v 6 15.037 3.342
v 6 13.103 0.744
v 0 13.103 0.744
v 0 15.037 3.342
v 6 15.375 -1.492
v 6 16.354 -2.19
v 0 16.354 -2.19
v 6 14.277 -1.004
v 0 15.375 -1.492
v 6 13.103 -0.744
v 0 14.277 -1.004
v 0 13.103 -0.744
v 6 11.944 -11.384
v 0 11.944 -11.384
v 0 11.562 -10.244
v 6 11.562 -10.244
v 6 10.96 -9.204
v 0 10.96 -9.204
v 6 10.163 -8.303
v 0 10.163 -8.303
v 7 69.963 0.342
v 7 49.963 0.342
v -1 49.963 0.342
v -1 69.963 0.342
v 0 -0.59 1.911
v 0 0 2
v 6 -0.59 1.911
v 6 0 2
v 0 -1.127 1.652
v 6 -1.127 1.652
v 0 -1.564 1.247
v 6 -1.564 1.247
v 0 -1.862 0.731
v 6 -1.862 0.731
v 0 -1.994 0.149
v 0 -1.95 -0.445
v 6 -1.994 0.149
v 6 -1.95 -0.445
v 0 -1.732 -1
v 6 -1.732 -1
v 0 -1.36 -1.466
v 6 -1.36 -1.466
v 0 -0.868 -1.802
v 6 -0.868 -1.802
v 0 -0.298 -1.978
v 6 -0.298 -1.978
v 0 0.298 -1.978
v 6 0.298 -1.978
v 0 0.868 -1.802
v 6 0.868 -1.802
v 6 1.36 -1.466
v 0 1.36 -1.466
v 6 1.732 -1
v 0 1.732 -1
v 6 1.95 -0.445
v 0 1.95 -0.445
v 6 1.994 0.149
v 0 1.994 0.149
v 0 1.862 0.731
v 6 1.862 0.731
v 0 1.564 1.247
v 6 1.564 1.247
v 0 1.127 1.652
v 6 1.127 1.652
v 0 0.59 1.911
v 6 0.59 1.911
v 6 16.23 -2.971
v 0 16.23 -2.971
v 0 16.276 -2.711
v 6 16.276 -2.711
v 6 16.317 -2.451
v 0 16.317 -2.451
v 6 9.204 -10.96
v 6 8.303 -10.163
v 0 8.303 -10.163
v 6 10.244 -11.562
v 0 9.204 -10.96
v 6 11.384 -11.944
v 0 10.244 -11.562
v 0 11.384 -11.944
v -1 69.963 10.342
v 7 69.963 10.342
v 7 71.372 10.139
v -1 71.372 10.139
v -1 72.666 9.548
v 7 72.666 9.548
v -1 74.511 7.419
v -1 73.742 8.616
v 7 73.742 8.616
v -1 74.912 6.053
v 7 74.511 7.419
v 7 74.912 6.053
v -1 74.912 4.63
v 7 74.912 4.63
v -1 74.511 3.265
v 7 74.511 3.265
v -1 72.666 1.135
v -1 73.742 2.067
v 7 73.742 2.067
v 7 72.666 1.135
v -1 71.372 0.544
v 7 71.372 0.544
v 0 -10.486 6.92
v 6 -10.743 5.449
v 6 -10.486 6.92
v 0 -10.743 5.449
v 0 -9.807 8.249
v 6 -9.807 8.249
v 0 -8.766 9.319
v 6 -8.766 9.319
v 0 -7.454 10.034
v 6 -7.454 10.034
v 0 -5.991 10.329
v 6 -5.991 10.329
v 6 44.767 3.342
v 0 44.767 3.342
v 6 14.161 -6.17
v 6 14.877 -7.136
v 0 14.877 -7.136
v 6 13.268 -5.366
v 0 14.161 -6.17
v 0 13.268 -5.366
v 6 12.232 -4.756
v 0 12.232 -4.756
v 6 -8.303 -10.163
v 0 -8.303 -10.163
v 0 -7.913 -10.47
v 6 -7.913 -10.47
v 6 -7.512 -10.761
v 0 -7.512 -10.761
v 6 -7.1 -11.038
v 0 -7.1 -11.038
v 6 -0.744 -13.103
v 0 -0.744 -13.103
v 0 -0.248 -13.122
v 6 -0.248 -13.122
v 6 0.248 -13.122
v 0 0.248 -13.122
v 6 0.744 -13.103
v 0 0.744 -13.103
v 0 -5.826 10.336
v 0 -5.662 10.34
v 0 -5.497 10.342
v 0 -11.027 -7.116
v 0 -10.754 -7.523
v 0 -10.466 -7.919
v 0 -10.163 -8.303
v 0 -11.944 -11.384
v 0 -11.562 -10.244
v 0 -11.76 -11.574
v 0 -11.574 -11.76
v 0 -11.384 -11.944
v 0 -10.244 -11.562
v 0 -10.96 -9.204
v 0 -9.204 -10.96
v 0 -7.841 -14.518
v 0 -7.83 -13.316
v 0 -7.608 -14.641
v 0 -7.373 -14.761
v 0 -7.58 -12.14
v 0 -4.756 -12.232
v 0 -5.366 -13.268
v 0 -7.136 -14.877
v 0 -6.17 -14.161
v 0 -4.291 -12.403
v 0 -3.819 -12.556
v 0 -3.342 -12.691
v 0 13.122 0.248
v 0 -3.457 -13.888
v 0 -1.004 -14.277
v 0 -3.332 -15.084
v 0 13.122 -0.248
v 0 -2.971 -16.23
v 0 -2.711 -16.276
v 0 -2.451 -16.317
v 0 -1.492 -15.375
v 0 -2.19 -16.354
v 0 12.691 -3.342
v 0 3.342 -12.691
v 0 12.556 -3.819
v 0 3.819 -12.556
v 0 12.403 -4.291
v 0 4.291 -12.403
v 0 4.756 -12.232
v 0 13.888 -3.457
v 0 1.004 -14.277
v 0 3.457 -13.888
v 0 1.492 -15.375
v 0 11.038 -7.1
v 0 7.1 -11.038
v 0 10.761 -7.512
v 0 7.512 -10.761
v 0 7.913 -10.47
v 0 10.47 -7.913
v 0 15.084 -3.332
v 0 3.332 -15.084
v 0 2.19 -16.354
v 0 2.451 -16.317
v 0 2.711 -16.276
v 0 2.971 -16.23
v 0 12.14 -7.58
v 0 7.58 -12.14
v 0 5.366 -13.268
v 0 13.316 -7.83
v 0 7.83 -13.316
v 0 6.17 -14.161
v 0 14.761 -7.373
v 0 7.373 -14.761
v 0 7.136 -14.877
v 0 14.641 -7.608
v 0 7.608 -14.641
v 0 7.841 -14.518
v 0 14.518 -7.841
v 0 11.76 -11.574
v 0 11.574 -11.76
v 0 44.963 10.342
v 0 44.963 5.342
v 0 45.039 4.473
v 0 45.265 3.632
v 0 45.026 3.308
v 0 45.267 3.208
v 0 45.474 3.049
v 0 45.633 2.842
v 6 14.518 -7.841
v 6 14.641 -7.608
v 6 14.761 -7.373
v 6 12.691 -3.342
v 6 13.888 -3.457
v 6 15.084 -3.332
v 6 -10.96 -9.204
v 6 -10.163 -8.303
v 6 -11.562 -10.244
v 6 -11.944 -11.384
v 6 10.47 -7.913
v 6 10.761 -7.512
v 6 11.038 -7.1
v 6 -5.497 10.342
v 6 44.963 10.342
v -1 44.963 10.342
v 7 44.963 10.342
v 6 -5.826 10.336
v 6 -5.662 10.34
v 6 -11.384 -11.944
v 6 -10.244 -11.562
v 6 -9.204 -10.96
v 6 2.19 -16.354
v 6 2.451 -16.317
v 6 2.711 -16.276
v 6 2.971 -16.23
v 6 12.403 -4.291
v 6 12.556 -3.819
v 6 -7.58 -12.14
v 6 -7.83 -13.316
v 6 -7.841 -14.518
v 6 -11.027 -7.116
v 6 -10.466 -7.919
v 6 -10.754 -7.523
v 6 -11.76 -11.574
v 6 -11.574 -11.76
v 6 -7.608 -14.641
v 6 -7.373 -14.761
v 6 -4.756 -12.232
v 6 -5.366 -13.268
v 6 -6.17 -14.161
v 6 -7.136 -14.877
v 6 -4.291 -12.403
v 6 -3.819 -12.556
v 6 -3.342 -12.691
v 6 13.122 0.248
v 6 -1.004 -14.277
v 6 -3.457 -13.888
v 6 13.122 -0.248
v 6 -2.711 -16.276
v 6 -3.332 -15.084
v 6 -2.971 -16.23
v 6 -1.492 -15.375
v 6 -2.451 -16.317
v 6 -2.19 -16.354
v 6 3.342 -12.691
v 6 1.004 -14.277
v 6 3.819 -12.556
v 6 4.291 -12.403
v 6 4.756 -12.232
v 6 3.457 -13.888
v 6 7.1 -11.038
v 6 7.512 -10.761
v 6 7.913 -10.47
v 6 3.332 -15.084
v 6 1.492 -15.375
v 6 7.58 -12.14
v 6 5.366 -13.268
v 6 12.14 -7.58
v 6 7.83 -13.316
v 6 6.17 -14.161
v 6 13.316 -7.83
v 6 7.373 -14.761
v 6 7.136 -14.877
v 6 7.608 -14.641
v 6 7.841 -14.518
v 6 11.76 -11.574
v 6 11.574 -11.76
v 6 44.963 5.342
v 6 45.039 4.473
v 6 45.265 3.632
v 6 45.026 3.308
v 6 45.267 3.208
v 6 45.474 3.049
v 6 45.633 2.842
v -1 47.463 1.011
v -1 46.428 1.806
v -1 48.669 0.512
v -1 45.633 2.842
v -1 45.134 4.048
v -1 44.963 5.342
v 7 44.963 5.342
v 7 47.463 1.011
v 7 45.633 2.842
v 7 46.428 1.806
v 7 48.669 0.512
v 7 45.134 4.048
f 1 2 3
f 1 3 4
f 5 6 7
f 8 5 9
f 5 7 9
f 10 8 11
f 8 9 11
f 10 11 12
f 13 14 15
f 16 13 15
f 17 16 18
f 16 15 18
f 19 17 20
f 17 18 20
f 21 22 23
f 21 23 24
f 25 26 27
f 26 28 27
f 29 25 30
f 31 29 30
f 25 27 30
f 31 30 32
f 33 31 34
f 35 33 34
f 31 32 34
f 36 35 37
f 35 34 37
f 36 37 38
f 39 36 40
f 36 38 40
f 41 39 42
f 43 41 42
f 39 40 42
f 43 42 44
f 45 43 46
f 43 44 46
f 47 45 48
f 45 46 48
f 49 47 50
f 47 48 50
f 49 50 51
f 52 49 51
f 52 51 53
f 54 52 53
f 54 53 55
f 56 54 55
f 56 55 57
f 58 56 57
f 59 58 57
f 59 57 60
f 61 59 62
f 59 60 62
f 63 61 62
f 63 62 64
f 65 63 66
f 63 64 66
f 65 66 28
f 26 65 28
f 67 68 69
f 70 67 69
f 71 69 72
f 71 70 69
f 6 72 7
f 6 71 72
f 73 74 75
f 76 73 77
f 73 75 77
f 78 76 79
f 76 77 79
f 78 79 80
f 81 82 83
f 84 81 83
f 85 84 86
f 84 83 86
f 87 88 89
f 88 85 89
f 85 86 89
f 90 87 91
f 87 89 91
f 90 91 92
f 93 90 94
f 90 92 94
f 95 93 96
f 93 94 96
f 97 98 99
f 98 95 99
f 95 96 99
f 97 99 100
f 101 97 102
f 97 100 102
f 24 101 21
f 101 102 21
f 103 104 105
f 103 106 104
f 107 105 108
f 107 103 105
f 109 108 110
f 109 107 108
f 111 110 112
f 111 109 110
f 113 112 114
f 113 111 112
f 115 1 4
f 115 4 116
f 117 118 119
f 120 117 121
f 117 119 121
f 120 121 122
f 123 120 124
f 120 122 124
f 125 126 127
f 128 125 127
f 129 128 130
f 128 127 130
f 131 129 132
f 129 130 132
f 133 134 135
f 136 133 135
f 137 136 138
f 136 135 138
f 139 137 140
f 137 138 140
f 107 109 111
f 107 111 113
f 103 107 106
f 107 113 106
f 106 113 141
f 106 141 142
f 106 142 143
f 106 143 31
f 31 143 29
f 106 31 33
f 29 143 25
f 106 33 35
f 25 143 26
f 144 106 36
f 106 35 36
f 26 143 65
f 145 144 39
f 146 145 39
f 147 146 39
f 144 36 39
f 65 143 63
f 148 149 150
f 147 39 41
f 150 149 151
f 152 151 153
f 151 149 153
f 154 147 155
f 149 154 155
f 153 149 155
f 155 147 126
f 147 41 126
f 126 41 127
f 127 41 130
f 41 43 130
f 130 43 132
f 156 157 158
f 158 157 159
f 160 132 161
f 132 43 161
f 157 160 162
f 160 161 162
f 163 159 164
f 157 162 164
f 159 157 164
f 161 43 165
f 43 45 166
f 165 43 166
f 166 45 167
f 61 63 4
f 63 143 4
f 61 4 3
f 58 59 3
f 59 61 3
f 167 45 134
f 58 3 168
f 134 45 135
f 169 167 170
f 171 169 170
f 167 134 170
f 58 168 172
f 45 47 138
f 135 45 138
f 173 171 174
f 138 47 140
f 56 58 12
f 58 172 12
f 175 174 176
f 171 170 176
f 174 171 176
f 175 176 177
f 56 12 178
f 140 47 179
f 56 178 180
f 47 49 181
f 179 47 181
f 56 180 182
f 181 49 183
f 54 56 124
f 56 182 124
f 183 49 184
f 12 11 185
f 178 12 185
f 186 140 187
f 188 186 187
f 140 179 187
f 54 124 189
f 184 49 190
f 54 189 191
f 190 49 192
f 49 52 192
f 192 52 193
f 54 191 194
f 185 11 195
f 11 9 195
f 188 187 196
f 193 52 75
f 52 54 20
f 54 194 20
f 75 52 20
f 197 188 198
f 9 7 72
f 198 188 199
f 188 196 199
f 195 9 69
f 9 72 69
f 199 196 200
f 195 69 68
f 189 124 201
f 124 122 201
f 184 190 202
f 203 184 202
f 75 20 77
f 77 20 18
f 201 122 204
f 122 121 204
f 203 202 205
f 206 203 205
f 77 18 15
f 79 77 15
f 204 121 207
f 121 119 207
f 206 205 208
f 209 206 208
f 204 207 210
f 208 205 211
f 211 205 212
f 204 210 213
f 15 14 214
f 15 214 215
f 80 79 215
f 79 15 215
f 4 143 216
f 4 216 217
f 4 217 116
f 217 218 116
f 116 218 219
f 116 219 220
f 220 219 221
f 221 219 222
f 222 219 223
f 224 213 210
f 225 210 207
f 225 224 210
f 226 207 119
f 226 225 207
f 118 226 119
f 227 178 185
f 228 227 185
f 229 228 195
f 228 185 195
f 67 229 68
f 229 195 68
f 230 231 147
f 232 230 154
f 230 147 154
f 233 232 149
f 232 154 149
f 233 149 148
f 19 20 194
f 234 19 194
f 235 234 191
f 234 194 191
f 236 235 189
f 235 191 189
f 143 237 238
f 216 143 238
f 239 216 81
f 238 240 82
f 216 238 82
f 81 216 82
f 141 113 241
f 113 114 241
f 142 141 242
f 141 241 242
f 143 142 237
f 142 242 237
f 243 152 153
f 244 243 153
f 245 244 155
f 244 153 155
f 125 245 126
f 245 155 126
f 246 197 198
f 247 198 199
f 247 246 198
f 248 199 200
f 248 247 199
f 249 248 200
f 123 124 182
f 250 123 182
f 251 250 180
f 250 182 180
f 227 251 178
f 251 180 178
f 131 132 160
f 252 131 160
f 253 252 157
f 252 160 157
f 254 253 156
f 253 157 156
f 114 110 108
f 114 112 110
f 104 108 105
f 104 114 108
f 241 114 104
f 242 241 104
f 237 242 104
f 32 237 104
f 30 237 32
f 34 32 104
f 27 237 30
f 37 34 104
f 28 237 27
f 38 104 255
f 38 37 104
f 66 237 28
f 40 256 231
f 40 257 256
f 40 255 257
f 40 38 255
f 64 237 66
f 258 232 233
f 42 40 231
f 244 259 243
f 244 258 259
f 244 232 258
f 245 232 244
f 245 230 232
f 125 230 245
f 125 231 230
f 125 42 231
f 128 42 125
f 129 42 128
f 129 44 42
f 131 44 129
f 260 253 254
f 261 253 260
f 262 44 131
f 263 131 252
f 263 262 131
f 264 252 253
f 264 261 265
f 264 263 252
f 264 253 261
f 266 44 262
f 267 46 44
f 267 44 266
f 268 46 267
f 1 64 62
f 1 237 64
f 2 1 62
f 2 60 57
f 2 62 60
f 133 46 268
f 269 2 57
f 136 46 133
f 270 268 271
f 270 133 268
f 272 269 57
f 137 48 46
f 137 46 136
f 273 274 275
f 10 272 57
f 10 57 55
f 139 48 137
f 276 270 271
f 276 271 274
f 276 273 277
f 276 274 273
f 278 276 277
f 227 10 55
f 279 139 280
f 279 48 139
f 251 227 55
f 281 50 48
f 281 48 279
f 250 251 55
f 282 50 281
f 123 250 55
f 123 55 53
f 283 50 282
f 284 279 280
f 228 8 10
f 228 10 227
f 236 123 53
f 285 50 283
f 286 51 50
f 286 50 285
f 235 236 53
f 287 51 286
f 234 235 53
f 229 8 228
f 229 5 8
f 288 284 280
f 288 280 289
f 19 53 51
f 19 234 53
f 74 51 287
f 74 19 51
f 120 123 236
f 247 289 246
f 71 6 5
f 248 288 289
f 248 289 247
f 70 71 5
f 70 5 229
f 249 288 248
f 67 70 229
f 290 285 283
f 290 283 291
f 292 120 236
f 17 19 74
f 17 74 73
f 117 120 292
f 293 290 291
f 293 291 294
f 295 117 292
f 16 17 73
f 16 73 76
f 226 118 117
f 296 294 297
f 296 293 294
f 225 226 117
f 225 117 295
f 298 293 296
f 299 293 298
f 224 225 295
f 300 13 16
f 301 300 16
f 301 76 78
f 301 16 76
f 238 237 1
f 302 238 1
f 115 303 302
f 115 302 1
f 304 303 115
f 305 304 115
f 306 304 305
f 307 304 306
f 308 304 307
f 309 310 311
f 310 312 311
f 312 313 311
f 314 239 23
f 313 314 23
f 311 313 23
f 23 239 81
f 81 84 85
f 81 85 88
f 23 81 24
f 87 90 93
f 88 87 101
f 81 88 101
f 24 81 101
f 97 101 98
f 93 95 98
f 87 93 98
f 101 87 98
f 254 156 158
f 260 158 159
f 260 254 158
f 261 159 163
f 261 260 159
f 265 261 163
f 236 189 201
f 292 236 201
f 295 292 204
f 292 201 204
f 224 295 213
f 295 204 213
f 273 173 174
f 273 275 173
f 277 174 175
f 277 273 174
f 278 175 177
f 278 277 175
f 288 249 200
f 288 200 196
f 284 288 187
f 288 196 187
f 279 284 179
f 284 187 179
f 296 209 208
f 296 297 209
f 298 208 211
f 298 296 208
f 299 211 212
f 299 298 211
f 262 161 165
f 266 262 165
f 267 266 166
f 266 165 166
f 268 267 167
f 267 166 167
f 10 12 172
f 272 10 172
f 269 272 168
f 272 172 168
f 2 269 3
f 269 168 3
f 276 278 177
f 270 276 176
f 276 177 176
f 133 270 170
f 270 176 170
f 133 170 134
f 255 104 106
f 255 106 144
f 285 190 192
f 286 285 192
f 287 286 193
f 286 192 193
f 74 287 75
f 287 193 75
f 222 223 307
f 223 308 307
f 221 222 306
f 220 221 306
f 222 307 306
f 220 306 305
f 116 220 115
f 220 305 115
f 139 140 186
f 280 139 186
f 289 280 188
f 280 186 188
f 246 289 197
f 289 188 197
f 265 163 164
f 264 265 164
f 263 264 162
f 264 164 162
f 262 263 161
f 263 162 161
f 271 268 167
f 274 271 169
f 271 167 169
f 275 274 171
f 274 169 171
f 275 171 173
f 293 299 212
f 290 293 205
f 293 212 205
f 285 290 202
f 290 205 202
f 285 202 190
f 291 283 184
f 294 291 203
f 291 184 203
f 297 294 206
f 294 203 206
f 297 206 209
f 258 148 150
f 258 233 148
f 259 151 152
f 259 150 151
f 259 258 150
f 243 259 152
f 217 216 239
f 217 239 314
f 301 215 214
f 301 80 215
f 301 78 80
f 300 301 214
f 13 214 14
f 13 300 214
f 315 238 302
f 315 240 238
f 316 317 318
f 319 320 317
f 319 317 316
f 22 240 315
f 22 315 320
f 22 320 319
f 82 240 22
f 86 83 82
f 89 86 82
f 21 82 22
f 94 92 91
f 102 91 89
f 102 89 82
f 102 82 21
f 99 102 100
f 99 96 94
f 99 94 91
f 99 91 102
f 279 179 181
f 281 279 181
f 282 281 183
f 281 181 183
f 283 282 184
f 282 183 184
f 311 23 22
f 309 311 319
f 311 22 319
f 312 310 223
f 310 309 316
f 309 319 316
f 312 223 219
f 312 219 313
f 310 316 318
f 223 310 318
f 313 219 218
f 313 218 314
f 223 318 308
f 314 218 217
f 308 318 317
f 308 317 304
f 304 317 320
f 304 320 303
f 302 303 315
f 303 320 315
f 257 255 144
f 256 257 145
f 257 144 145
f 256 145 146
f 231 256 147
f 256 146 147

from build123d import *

# Parameters (mm, degrees)
BASPROSKE_W         = 6
BASPROSKE_H         = 16.5
TOOTHCUT_DEPTH      = 25.093567606
TEETHCUTS_COUNT     = 20
TEETHCUTS_ANGLE     = 342
BORSKE_R            = 2
BORE_DEPTH          = 50.0000508
SKETCH1_W           = 14.532002023
SKETCH1_H           = 35.225661126
CUT_EXTRUDE1_DEPTH  = 5
SKETCH3_W           = 7
SKETCH3_H           = 90
BOSS_EXTRUDE2_DEPTH = 3
SKETCH4_W           = 10
SKETCH4_H           = 30
BOSS_EXTRUDE3_DEPTH = 4
FILLET1_R           = 10
FILLET4_R           = 5
FILLET5_R           = 1
CUT_EXTRUDE4_DEPTH  = 4
CUT_EXTRUDE6_DEPTH  = 4
FILLET6_R           = 5


with BuildPart() as part:
    # BasProSke → Base-Revolve (revolve)
    with BuildSketch(Plane(origin=(0, 0, 0), x_dir=(1, 0, 0), z_dir=(0, 1, 0)), mode=Mode.PRIVATE) as base_revolve_sk:
        with Locations((3, 8.25)):
            Rectangle(BASPROSKE_W, BASPROSKE_H)
    revolve(base_revolve_sk.sketch.rotate(Axis((-10, 0, 0), (1, 0, 0)), 180), axis=Axis((-10, 0, 0), (1, 0, 0)))

    # TooCutSke → ToothCut (cut, through all)
    with BuildSketch(Plane(origin=(0, 0, 0), x_dir=(0, 0, -1), z_dir=(1, 0, 0))):
        with BuildLine():
            ThreePointArc((0.74381438, 13.102904875), (0, 13.124), (-0.74381438, 13.102904875))
            ThreePointArc((-0.74381438, 13.102904875), (-1.226473103, 14.852072512), (-2.209965745, 16.376962373))
            ThreePointArc((-2.209965745, 16.376962373), (0, 16.5254), (2.209965745, 16.376962373))
            ThreePointArc((2.209965745, 16.376962373), (1.226473103, 14.852072512), (0.74381438, 13.102904875))
        make_face()
    toothcut = extrude(amount=TOOTHCUT_DEPTH, mode=Mode.SUBTRACT)

    # TeethCuts: ToothCut ×20 about axis
    teethcuts_axis = Axis((-10, 0, 0), (1, 0, 0))
    for i in range(1, TEETHCUTS_COUNT):
        add(toothcut.rotate(teethcuts_axis, i * TEETHCUTS_ANGLE / (TEETHCUTS_COUNT - 1)), mode=Mode.SUBTRACT)

    # BorSke → Bore (cut, symmetric)
    with BuildSketch(Plane(origin=(0, 0, 0), x_dir=(0, 0, -1), z_dir=(1, 0, 0))):
        with Locations(Location((0, 0, 0), (0, 0, 180))):
            Circle(BORSKE_R)
    extrude(amount=BORE_DEPTH, both=True, mode=Mode.SUBTRACT)

    # Sketch1 → Cut-Extrude1 (cut, symmetric)
    with BuildSketch(Plane(origin=(3, 0, 0), x_dir=(0, 0, -1), z_dir=(1, 0, 0))):
        with Locations((-10.60761178, 0.822467031)):
            Rectangle(SKETCH1_W, SKETCH1_H)
    extrude(amount=CUT_EXTRUDE1_DEPTH, both=True, mode=Mode.SUBTRACT)

    # Sketch3 → Boss-Extrude2 (add, symmetric)
    with BuildSketch(Plane(origin=(3, 0, 0), x_dir=(0, 0, -1), z_dir=(1, 0, 0))):
        with Locations((-6.841610769, 29.963142125)):
            Rectangle(SKETCH3_W, SKETCH3_H)
    extrude(amount=BOSS_EXTRUDE2_DEPTH, both=True)

    # Sketch4 → Boss-Extrude3 (add, symmetric)
    with BuildSketch(Plane(origin=(3, 0, 0), x_dir=(0, 0, -1), z_dir=(1, 0, 0))):
        with Locations((-5.341610769, 59.963142125)):
            Rectangle(SKETCH4_W, SKETCH4_H)
    extrude(amount=BOSS_EXTRUDE3_DEPTH, both=True)

    # Fillet1
    # the kernel refuses this fillet: 10 mm, written as the material it takes off along each edge
    with BuildSketch(Plane(origin=(29.848480035, -15.036857875, 10.341610769), x_dir=(0, 0, -1), z_dir=(-1, 0, 0))) as fillet1_piece_1:
        with BuildLine():
            CenterArc((10, -9.539392014), FILLET1_R, 107.457603124, 72.542396876)
            Line((0, -9.539392014), (-0.2, -9.539392014))
            Line((-0.2, -9.539392014), (-0.2, 0))
            Line((-0.2, 0), (0, 0.2))
            ThreePointArc((0, 0.2), (3.5, 0.2), (6.94, 0.19078784))
            Line((6.94, 0.19078784), (7, 0))
        make_face()
    extrude(amount=53.696960071, mode=Mode.SUBTRACT)

    # Fillet4
    # the kernel refuses this fillet: 5 mm, written as the material it takes off along each edge
    with BuildSketch(Plane(origin=(19.5, 44.963142125, 0.341610769), x_dir=(0, 0, 1), z_dir=(-1, 0, 0))) as fillet4_piece_1_section:
        with BuildLine():
            CenterArc((FILLET4_R, FILLET4_R), FILLET4_R, 180, 90)
            Line((0, FILLET4_R), (0, 0))
            Line((0, 0), (FILLET4_R, 0))
        make_face()
    fillet4_piece_1 = extrude(amount=33, mode=Mode.PRIVATE)
    fillet4_piece_1 = split(fillet4_piece_1, bisect_by=Plane(origin=(12.75, 45.013801365, 3.341610769), z_dir=(0, 0, 1)), keep=Keep.TOP, mode=Mode.PRIVATE)
    fillet4_piece_1 = split(fillet4_piece_1, bisect_by=Plane(origin=(6, 45.013801365, 4.050354099), z_dir=(1, 0, 0)), keep=Keep.TOP, mode=Mode.PRIVATE)
    add(fillet4_piece_1, mode=Mode.SUBTRACT)
    with BuildSketch(Plane(origin=(19.5, 44.963142125, 0.341610769), x_dir=(0, 0, 1), z_dir=(-1, 0, 0))) as fillet4_piece_2_section:
        with BuildLine():
            CenterArc((FILLET4_R, FILLET4_R), FILLET4_R, 180, 90)
            Line((0, FILLET4_R), (0, 0))
            Line((0, 0), (FILLET4_R, 0))
        make_face()
    fillet4_piece_2 = extrude(amount=33, mode=Mode.PRIVATE)
    fillet4_piece_2 = split(fillet4_piece_2, bisect_by=Plane(origin=(12.75, 46.181868003, 3.341610769), z_dir=(0, 0, -1)), keep=Keep.TOP, mode=Mode.PRIVATE)
    fillet4_piece_2 = split(fillet4_piece_2, bisect_by=Plane(origin=(6, 46.181868003, 1.266861087), z_dir=(1, 0, 0)), keep=Keep.TOP, mode=Mode.PRIVATE)
    add(fillet4_piece_2, mode=Mode.SUBTRACT)
    with BuildSketch(Plane(origin=(19.5, 44.963142125, 0.341610769), x_dir=(0, 0, 1), z_dir=(-1, 0, 0))) as fillet4_piece_3_section:
        with BuildLine():
            CenterArc((FILLET4_R, FILLET4_R), FILLET4_R, 180, 90)
            Line((0, FILLET4_R), (0, 0))
            Line((0, 0), (FILLET4_R, 0))
        make_face()
    fillet4_piece_3 = extrude(amount=33, mode=Mode.PRIVATE)
    fillet4_piece_3 = split(fillet4_piece_3, bisect_by=Plane(origin=(0, 46.181868003, 1.266861087), z_dir=(1, 0, 0)), keep=Keep.TOP, mode=Mode.PRIVATE)
    fillet4_piece_3 = split(fillet4_piece_3, bisect_by=Plane(origin=(3, 46.181868003, 3.341610769), z_dir=(0, 0, -1)), keep=Keep.TOP, mode=Mode.PRIVATE)
    fillet4_piece_3 = split(fillet4_piece_3, bisect_by=Plane(origin=(6, 46.181868003, 1.266861087), z_dir=(-1, 0, 0)), keep=Keep.TOP, mode=Mode.PRIVATE)
    add(fillet4_piece_3, mode=Mode.SUBTRACT)
    with BuildSketch(Plane(origin=(19.5, 44.963142125, 0.341610769), x_dir=(0, 0, 1), z_dir=(-1, 0, 0))) as fillet4_piece_4_section:
        with BuildLine():
            CenterArc((FILLET4_R, FILLET4_R), FILLET4_R, 180, 90)
            Line((0, FILLET4_R), (0, 0))
            Line((0, 0), (FILLET4_R, 0))
        make_face()
    fillet4_piece_4 = extrude(amount=33, mode=Mode.PRIVATE)
    fillet4_piece_4 = split(fillet4_piece_4, bisect_by=Plane(origin=(0, 45.013801365, 4.050354099), z_dir=(-1, 0, 0)), keep=Keep.TOP, mode=Mode.PRIVATE)
    fillet4_piece_4 = split(fillet4_piece_4, bisect_by=Plane(origin=(-6.75, 45.013801365, 3.341610769), z_dir=(0, 0, 1)), keep=Keep.TOP, mode=Mode.PRIVATE)
    add(fillet4_piece_4, mode=Mode.SUBTRACT)
    with BuildSketch(Plane(origin=(19.5, 44.963142125, 0.341610769), x_dir=(0, 0, 1), z_dir=(-1, 0, 0))) as fillet4_piece_5_section:
        with BuildLine():
            CenterArc((FILLET4_R, FILLET4_R), FILLET4_R, 180, 90)
            Line((0, FILLET4_R), (0, 0))
            Line((0, 0), (FILLET4_R, 0))
        make_face()
    fillet4_piece_5 = extrude(amount=33, mode=Mode.PRIVATE)
    fillet4_piece_5 = split(fillet4_piece_5, bisect_by=Plane(origin=(0, 46.181868003, 1.266861087), z_dir=(-1, 0, 0)), keep=Keep.TOP, mode=Mode.PRIVATE)
    fillet4_piece_5 = split(fillet4_piece_5, bisect_by=Plane(origin=(-6.75, 46.181868003, 3.341610769), z_dir=(0, 0, -1)), keep=Keep.TOP, mode=Mode.PRIVATE)
    add(fillet4_piece_5, mode=Mode.SUBTRACT)
    with BuildSketch(Plane(origin=(19.5, 74.963142125, 10.341610769), x_dir=(0, -1, 0), z_dir=(-1, 0, 0))) as fillet4_piece_6:
        with BuildLine():
            CenterArc((FILLET4_R, -FILLET4_R), FILLET4_R, 90, 90)
            Line((0, -FILLET4_R), (0, 0))
            Line((0, 0), (FILLET4_R, 0))
        make_face()
    extrude(amount=33, mode=Mode.SUBTRACT)
    with BuildSketch(Plane(origin=(19.5, 74.963142125, 0.341610769), x_dir=(0, -1, 0), z_dir=(-1, 0, 0))) as fillet4_piece_7:
        with BuildLine():
            CenterArc((FILLET4_R, FILLET4_R), FILLET4_R, 180, 90)
            Line((0, FILLET4_R), (0, 0))
            Line((0, 0), (FILLET4_R, 0))
        make_face()
    extrude(amount=33, mode=Mode.SUBTRACT)

    # Fillet5
    fillet5_edges = [part.edges().sort_by_distance(p)[0] for p in [
        (3, 45.38056643, 3.341610769),
    ]]
    fillet(fillet5_edges, radius=FILLET5_R)

    # Sketch5 → Cut-Extrude4 (cut, symmetric)
    with BuildSketch(Plane(origin=(3, 0, 0), x_dir=(0, 0, -1), z_dir=(1, 0, 0))):
        Polygon((-0.646757919, 13.233276671), (-0.74381438, 13.102904875), (-3.341610769, 15.036857875), (-3.193884675, 16.241167121), (-1.325890901, 16.884807614), align=None)
    extrude(amount=CUT_EXTRUDE4_DEPTH, both=True, mode=Mode.SUBTRACT)

    # Sketch7 → Cut-Extrude6 (cut, symmetric)
    with BuildSketch(Plane(origin=(3, 0, 0), x_dir=(0, 0, -1), z_dir=(1, 0, 0))):
        Polygon((-7.363012022, -15.230284447), (-8.903180744, -10.664623645), (7.578586785, -11.037675843), (10.397777633, -17.422865984), (-4.980223066, -17.422865984), align=None)
    extrude(amount=CUT_EXTRUDE6_DEPTH, both=True, mode=Mode.SUBTRACT)

    # Fillet6
    fillet6_edges = [part.edges().sort_by_distance(p)[0] for p in [
        (3, -10.664623645, 8.903180744),
    ]]
    fillet(fillet6_edges, radius=FILLET6_R)


solid = part.part
